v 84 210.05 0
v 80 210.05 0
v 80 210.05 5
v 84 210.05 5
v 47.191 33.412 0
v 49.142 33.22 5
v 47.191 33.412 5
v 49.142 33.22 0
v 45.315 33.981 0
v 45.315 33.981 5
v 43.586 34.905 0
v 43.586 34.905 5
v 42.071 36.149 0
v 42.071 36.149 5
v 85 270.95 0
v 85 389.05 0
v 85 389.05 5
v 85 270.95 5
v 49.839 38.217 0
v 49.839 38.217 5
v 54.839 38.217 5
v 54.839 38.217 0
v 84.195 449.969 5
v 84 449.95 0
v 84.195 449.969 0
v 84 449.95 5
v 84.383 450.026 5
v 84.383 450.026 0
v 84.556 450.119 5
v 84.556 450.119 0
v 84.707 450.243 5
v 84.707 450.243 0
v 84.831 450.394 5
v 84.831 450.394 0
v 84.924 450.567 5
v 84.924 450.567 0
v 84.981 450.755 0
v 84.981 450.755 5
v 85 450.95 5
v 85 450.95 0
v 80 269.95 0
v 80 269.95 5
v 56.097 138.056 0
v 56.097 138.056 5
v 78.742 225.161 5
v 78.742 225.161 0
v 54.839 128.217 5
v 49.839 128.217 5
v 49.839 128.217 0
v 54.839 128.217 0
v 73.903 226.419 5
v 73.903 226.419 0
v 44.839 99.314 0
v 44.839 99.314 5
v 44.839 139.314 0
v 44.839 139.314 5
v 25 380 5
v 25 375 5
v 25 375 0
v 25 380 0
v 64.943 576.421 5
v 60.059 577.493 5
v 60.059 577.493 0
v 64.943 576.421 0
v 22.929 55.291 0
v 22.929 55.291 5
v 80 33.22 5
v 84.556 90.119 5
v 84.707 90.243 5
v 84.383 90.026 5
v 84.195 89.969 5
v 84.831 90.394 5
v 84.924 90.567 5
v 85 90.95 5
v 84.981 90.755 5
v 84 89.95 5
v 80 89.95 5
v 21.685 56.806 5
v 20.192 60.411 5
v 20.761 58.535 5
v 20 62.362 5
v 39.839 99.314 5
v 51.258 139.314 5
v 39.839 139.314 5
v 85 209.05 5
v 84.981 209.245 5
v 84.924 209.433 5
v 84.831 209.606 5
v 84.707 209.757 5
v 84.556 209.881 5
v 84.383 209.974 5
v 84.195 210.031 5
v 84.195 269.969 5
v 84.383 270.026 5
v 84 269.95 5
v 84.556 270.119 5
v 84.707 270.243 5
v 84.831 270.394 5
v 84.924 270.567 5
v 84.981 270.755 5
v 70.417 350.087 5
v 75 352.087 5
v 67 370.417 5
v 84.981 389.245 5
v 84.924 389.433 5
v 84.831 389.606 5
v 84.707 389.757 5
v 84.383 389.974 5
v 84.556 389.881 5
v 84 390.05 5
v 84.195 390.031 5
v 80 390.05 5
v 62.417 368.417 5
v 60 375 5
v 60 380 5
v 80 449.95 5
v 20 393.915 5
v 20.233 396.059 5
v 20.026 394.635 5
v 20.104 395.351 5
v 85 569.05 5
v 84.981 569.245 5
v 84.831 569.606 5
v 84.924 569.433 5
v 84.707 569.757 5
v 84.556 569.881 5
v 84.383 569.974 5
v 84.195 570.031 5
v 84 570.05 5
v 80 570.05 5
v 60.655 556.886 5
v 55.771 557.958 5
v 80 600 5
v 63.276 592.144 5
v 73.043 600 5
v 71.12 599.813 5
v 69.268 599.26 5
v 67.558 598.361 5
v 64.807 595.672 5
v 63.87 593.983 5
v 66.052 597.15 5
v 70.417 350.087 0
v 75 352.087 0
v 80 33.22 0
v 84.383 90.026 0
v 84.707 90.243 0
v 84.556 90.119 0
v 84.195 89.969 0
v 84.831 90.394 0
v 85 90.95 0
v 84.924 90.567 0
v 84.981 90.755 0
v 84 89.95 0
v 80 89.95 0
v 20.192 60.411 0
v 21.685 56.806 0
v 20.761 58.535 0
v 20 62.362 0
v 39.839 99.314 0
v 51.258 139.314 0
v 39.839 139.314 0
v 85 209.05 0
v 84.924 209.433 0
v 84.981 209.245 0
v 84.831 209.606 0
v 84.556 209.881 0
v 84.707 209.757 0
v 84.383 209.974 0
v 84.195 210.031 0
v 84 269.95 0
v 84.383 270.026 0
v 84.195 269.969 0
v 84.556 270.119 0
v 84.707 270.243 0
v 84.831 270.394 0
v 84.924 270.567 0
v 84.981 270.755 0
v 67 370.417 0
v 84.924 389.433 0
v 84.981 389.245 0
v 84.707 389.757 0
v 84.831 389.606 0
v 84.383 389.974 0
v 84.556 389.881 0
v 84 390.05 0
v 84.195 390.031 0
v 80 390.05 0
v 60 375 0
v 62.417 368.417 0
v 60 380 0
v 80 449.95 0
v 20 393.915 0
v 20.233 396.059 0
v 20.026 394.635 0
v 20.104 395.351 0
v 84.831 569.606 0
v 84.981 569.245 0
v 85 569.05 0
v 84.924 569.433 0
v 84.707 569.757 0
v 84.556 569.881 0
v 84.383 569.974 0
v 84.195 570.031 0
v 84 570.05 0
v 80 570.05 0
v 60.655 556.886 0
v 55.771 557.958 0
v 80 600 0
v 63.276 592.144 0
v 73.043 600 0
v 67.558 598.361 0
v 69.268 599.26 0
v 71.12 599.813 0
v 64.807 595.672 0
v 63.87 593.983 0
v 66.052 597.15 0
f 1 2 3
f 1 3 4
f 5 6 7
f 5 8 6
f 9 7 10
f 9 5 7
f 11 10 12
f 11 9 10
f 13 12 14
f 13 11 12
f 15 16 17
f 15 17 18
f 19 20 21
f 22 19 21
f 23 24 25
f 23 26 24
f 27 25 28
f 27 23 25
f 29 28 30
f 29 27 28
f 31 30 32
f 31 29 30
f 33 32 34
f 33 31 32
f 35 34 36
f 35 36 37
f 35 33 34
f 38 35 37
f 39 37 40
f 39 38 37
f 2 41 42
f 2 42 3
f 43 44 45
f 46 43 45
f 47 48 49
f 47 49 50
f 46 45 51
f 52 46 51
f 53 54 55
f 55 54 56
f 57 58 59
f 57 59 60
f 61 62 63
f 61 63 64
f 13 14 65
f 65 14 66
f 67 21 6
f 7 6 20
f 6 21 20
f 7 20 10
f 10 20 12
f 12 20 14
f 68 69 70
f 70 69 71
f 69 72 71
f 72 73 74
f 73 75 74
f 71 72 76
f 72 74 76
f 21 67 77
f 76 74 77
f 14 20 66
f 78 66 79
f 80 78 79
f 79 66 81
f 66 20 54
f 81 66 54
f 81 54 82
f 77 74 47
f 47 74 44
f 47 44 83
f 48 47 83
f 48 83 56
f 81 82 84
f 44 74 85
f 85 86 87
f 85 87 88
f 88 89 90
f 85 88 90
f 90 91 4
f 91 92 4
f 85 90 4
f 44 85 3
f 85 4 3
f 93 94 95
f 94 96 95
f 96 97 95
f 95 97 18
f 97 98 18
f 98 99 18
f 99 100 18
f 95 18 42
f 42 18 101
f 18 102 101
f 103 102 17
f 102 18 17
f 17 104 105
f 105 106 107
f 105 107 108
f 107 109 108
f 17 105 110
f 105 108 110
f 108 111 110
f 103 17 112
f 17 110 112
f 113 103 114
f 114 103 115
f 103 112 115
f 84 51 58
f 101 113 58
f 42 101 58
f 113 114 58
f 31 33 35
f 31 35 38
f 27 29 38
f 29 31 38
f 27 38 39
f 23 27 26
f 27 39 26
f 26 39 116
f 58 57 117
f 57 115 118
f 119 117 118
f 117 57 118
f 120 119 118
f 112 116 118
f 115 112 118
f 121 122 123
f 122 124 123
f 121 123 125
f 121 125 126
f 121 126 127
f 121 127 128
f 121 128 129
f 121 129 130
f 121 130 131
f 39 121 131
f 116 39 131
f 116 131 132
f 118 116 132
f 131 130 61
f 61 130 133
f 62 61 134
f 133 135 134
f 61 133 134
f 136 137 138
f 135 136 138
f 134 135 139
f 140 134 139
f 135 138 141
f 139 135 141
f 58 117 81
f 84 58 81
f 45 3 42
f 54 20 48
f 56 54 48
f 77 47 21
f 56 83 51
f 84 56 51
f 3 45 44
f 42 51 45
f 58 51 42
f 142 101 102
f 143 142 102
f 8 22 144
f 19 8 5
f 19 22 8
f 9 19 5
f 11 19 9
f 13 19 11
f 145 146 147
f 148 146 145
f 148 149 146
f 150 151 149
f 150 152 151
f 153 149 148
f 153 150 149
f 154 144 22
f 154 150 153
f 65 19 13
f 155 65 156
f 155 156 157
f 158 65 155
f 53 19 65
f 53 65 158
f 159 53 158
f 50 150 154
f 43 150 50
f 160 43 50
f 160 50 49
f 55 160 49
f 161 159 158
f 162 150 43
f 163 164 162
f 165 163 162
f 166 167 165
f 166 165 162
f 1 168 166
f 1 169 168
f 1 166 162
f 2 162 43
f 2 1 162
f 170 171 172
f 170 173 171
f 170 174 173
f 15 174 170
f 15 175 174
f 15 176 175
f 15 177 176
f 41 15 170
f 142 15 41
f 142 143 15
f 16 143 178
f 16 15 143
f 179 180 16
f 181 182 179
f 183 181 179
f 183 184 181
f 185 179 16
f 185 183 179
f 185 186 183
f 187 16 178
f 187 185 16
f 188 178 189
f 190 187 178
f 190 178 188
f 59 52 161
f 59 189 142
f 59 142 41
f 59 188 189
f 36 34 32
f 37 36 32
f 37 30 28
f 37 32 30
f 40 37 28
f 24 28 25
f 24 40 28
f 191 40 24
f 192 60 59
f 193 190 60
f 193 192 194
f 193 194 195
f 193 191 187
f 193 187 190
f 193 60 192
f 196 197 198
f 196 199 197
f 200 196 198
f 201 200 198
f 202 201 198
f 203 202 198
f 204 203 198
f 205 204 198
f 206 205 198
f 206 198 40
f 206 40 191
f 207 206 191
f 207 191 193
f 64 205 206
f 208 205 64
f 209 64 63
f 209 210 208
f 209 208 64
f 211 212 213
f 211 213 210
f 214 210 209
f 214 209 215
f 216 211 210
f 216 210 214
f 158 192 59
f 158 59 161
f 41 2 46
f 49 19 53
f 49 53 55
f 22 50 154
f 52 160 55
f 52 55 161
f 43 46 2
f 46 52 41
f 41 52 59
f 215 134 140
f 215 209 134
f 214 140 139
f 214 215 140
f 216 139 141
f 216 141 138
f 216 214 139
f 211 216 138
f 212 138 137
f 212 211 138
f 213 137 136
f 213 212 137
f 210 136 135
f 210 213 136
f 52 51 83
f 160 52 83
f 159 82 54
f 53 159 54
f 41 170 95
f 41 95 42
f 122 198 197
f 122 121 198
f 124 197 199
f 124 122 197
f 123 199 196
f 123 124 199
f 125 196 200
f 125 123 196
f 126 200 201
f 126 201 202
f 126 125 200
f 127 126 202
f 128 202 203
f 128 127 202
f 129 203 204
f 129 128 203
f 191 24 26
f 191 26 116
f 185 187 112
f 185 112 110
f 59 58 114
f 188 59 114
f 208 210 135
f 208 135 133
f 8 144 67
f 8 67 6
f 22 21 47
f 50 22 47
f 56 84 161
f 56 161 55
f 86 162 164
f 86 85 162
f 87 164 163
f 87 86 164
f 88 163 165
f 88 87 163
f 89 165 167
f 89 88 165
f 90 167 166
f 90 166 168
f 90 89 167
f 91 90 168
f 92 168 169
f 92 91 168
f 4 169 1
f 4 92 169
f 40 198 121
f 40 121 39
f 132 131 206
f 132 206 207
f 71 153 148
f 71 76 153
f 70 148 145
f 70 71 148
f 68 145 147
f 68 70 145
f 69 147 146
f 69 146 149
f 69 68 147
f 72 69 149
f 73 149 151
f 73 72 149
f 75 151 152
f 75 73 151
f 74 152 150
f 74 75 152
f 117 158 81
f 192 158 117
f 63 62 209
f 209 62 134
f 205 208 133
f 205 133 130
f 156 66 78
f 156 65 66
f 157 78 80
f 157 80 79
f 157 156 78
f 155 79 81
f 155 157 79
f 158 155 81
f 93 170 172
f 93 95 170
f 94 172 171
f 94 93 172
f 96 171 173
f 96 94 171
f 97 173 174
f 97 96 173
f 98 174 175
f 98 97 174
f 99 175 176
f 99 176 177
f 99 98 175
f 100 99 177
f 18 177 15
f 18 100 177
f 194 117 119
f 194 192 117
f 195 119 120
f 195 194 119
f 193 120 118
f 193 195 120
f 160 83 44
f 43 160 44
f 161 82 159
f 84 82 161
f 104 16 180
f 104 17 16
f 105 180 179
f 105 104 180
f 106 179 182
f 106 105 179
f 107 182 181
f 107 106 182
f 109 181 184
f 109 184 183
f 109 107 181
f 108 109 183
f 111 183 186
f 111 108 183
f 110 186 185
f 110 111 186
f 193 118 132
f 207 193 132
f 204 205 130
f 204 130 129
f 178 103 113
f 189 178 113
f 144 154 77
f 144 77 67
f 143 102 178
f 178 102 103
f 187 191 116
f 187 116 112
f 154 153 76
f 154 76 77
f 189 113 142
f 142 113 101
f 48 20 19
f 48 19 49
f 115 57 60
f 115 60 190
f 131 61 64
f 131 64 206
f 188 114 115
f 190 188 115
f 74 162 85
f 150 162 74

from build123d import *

# Parameters (mm, degrees)
BOSS_EXTRUDE1_DEPTH = 5
SKETCH2_W           = 5
SKETCH2_H           = 90
SKETCH2_H_2         = 40
SKETCH2_W_2         = 35
SKETCH2_H_3         = 5
CUT_EXTRUDE1_DEPTH  = 10
CUT_EXTRUDE2_DEPTH  = 10
FILLET1_R           = 1
FILLET2_R           = 10
CUT_EXTRUDE3_DEPTH  = 10


with BuildPart() as part:
    # Sketch1 → Boss-Extrude1 (new body)
    with BuildSketch(Plane.XY):
        Polygon((80, 33.22), (20, 33.22), (20, 600), (80, 600), (80, 570.05), (85, 570.05), (85, 449.95), (80, 449.95), (80, 390.05), (85, 390.05), (85, 269.95), (80, 269.95), (80, 210.05), (85, 210.05), (85, 89.95), (80, 89.95), align=None)
    extrude(amount=BOSS_EXTRUDE1_DEPTH)

    # Sketch2 → Cut-Extrude1 (cut)
    with BuildSketch(Plane.XY.offset(5)):
        Polygon((67, 370.417424305), (62.417424305, 368.417424305), (70.417424305, 350.087121525), (75, 352.087121525), align=None)
        Polygon((73.902811841, 226.418897298), (51.258042728, 139.314279557), (56.097188159, 138.056236829), (78.741957272, 225.16085457), align=None)
        with Locations((52.33914543, 83.217091399)):
            Rectangle(SKETCH2_W, SKETCH2_H)
        with Locations((42.33914543, 119.314279557)):
            Rectangle(SKETCH2_W, SKETCH2_H_2)
        with Locations((42.5, 377.5)):
            Rectangle(SKETCH2_W_2, SKETCH2_H_3)
    extrude(amount=-CUT_EXTRUDE1_DEPTH, mode=Mode.SUBTRACT)

    # Sketch3 → Cut-Extrude2 (cut)
    with BuildSketch(Plane.XY.offset(5)):
        Polygon((20, 395), (65, 600), (1.513631165, 616.08755832), align=None)
        Polygon((45, 33.22), (20, 58.22), (13.452472792, 20.556075169), align=None)
    extrude(amount=-CUT_EXTRUDE2_DEPTH, mode=Mode.SUBTRACT)

    # Fillet1
    fillet1_edges = [part.edges().sort_by_distance(p)[0] for p in [
        (85, 570.05, 2.5),
        (85, 449.95, 2.5),
        (85, 390.05, 2.5),
        (85, 269.95, 2.5),
        (85, 210.05, 2.5),
        (85, 89.95, 2.5),
    ]]
    fillet(fillet1_edges, radius=FILLET1_R)

    # Fillet2
    fillet2_edges = [part.edges().sort_by_distance(p)[0] for p in [
        (20, 395, 2.5),
        (65, 600, 2.5),
        (45, 33.22, 2.5),
        (20, 58.22, 2.5),
    ]]
    fillet(fillet2_edges, radius=FILLET2_R)

    # Sketch4 → Cut-Extrude3 (cut)
    with BuildSketch(Plane.XY.offset(5)):
        Polygon((60.059418786, 577.492907801), (64.943140501, 576.420871327), (60.654994605, 556.885984463), (55.771272889, 557.958020937), align=None)
    extrude(amount=-CUT_EXTRUDE3_DEPTH, mode=Mode.SUBTRACT)


solid = part.part
